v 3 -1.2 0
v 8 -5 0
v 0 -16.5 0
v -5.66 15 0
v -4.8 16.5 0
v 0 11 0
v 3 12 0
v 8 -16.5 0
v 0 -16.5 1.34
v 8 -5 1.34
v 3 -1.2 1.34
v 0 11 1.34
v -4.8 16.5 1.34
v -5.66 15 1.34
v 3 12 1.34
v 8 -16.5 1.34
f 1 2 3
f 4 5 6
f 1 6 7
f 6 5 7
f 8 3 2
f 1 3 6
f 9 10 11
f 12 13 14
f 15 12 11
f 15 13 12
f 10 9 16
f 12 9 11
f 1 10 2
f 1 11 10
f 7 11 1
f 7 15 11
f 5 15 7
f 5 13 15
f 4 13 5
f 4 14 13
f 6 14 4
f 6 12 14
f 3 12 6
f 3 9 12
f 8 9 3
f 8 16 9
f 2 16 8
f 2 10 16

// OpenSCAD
// file: ru9_02_ejector.scad
//
// RU9 family ejector
//

module ejector_2d () {
    // The angle of the tip is 60 degrees. We approximate in Carthesian.
    polygon([
        [ 3.0,  12.0],
        [ 3.0,  -1.2],
        [ 8.0,  -5.0],
        [ 8.0, -16.5],
        [ 0.0, -16.5],
        [ 0.0,  11.0],
        [-5.66, 15.00],
        [-4.80, 16.50]]
    );
}
// main file
//
// RU9 family
// 02: ejector, in 3D
//

use <ru9_02_ejector.scad>;

// The 1.34mm thick plate comes from a local hardware store.
// Closest American plates are:
//    16 Gauge = 1.588 mm
//    17 Gauge = 1.429 mm
//    18 Gauge = 1.270 mm
//
thickness = 1.34;

module main () {
    linear_extrude(height=thickness) ejector_2d();
}

main();
